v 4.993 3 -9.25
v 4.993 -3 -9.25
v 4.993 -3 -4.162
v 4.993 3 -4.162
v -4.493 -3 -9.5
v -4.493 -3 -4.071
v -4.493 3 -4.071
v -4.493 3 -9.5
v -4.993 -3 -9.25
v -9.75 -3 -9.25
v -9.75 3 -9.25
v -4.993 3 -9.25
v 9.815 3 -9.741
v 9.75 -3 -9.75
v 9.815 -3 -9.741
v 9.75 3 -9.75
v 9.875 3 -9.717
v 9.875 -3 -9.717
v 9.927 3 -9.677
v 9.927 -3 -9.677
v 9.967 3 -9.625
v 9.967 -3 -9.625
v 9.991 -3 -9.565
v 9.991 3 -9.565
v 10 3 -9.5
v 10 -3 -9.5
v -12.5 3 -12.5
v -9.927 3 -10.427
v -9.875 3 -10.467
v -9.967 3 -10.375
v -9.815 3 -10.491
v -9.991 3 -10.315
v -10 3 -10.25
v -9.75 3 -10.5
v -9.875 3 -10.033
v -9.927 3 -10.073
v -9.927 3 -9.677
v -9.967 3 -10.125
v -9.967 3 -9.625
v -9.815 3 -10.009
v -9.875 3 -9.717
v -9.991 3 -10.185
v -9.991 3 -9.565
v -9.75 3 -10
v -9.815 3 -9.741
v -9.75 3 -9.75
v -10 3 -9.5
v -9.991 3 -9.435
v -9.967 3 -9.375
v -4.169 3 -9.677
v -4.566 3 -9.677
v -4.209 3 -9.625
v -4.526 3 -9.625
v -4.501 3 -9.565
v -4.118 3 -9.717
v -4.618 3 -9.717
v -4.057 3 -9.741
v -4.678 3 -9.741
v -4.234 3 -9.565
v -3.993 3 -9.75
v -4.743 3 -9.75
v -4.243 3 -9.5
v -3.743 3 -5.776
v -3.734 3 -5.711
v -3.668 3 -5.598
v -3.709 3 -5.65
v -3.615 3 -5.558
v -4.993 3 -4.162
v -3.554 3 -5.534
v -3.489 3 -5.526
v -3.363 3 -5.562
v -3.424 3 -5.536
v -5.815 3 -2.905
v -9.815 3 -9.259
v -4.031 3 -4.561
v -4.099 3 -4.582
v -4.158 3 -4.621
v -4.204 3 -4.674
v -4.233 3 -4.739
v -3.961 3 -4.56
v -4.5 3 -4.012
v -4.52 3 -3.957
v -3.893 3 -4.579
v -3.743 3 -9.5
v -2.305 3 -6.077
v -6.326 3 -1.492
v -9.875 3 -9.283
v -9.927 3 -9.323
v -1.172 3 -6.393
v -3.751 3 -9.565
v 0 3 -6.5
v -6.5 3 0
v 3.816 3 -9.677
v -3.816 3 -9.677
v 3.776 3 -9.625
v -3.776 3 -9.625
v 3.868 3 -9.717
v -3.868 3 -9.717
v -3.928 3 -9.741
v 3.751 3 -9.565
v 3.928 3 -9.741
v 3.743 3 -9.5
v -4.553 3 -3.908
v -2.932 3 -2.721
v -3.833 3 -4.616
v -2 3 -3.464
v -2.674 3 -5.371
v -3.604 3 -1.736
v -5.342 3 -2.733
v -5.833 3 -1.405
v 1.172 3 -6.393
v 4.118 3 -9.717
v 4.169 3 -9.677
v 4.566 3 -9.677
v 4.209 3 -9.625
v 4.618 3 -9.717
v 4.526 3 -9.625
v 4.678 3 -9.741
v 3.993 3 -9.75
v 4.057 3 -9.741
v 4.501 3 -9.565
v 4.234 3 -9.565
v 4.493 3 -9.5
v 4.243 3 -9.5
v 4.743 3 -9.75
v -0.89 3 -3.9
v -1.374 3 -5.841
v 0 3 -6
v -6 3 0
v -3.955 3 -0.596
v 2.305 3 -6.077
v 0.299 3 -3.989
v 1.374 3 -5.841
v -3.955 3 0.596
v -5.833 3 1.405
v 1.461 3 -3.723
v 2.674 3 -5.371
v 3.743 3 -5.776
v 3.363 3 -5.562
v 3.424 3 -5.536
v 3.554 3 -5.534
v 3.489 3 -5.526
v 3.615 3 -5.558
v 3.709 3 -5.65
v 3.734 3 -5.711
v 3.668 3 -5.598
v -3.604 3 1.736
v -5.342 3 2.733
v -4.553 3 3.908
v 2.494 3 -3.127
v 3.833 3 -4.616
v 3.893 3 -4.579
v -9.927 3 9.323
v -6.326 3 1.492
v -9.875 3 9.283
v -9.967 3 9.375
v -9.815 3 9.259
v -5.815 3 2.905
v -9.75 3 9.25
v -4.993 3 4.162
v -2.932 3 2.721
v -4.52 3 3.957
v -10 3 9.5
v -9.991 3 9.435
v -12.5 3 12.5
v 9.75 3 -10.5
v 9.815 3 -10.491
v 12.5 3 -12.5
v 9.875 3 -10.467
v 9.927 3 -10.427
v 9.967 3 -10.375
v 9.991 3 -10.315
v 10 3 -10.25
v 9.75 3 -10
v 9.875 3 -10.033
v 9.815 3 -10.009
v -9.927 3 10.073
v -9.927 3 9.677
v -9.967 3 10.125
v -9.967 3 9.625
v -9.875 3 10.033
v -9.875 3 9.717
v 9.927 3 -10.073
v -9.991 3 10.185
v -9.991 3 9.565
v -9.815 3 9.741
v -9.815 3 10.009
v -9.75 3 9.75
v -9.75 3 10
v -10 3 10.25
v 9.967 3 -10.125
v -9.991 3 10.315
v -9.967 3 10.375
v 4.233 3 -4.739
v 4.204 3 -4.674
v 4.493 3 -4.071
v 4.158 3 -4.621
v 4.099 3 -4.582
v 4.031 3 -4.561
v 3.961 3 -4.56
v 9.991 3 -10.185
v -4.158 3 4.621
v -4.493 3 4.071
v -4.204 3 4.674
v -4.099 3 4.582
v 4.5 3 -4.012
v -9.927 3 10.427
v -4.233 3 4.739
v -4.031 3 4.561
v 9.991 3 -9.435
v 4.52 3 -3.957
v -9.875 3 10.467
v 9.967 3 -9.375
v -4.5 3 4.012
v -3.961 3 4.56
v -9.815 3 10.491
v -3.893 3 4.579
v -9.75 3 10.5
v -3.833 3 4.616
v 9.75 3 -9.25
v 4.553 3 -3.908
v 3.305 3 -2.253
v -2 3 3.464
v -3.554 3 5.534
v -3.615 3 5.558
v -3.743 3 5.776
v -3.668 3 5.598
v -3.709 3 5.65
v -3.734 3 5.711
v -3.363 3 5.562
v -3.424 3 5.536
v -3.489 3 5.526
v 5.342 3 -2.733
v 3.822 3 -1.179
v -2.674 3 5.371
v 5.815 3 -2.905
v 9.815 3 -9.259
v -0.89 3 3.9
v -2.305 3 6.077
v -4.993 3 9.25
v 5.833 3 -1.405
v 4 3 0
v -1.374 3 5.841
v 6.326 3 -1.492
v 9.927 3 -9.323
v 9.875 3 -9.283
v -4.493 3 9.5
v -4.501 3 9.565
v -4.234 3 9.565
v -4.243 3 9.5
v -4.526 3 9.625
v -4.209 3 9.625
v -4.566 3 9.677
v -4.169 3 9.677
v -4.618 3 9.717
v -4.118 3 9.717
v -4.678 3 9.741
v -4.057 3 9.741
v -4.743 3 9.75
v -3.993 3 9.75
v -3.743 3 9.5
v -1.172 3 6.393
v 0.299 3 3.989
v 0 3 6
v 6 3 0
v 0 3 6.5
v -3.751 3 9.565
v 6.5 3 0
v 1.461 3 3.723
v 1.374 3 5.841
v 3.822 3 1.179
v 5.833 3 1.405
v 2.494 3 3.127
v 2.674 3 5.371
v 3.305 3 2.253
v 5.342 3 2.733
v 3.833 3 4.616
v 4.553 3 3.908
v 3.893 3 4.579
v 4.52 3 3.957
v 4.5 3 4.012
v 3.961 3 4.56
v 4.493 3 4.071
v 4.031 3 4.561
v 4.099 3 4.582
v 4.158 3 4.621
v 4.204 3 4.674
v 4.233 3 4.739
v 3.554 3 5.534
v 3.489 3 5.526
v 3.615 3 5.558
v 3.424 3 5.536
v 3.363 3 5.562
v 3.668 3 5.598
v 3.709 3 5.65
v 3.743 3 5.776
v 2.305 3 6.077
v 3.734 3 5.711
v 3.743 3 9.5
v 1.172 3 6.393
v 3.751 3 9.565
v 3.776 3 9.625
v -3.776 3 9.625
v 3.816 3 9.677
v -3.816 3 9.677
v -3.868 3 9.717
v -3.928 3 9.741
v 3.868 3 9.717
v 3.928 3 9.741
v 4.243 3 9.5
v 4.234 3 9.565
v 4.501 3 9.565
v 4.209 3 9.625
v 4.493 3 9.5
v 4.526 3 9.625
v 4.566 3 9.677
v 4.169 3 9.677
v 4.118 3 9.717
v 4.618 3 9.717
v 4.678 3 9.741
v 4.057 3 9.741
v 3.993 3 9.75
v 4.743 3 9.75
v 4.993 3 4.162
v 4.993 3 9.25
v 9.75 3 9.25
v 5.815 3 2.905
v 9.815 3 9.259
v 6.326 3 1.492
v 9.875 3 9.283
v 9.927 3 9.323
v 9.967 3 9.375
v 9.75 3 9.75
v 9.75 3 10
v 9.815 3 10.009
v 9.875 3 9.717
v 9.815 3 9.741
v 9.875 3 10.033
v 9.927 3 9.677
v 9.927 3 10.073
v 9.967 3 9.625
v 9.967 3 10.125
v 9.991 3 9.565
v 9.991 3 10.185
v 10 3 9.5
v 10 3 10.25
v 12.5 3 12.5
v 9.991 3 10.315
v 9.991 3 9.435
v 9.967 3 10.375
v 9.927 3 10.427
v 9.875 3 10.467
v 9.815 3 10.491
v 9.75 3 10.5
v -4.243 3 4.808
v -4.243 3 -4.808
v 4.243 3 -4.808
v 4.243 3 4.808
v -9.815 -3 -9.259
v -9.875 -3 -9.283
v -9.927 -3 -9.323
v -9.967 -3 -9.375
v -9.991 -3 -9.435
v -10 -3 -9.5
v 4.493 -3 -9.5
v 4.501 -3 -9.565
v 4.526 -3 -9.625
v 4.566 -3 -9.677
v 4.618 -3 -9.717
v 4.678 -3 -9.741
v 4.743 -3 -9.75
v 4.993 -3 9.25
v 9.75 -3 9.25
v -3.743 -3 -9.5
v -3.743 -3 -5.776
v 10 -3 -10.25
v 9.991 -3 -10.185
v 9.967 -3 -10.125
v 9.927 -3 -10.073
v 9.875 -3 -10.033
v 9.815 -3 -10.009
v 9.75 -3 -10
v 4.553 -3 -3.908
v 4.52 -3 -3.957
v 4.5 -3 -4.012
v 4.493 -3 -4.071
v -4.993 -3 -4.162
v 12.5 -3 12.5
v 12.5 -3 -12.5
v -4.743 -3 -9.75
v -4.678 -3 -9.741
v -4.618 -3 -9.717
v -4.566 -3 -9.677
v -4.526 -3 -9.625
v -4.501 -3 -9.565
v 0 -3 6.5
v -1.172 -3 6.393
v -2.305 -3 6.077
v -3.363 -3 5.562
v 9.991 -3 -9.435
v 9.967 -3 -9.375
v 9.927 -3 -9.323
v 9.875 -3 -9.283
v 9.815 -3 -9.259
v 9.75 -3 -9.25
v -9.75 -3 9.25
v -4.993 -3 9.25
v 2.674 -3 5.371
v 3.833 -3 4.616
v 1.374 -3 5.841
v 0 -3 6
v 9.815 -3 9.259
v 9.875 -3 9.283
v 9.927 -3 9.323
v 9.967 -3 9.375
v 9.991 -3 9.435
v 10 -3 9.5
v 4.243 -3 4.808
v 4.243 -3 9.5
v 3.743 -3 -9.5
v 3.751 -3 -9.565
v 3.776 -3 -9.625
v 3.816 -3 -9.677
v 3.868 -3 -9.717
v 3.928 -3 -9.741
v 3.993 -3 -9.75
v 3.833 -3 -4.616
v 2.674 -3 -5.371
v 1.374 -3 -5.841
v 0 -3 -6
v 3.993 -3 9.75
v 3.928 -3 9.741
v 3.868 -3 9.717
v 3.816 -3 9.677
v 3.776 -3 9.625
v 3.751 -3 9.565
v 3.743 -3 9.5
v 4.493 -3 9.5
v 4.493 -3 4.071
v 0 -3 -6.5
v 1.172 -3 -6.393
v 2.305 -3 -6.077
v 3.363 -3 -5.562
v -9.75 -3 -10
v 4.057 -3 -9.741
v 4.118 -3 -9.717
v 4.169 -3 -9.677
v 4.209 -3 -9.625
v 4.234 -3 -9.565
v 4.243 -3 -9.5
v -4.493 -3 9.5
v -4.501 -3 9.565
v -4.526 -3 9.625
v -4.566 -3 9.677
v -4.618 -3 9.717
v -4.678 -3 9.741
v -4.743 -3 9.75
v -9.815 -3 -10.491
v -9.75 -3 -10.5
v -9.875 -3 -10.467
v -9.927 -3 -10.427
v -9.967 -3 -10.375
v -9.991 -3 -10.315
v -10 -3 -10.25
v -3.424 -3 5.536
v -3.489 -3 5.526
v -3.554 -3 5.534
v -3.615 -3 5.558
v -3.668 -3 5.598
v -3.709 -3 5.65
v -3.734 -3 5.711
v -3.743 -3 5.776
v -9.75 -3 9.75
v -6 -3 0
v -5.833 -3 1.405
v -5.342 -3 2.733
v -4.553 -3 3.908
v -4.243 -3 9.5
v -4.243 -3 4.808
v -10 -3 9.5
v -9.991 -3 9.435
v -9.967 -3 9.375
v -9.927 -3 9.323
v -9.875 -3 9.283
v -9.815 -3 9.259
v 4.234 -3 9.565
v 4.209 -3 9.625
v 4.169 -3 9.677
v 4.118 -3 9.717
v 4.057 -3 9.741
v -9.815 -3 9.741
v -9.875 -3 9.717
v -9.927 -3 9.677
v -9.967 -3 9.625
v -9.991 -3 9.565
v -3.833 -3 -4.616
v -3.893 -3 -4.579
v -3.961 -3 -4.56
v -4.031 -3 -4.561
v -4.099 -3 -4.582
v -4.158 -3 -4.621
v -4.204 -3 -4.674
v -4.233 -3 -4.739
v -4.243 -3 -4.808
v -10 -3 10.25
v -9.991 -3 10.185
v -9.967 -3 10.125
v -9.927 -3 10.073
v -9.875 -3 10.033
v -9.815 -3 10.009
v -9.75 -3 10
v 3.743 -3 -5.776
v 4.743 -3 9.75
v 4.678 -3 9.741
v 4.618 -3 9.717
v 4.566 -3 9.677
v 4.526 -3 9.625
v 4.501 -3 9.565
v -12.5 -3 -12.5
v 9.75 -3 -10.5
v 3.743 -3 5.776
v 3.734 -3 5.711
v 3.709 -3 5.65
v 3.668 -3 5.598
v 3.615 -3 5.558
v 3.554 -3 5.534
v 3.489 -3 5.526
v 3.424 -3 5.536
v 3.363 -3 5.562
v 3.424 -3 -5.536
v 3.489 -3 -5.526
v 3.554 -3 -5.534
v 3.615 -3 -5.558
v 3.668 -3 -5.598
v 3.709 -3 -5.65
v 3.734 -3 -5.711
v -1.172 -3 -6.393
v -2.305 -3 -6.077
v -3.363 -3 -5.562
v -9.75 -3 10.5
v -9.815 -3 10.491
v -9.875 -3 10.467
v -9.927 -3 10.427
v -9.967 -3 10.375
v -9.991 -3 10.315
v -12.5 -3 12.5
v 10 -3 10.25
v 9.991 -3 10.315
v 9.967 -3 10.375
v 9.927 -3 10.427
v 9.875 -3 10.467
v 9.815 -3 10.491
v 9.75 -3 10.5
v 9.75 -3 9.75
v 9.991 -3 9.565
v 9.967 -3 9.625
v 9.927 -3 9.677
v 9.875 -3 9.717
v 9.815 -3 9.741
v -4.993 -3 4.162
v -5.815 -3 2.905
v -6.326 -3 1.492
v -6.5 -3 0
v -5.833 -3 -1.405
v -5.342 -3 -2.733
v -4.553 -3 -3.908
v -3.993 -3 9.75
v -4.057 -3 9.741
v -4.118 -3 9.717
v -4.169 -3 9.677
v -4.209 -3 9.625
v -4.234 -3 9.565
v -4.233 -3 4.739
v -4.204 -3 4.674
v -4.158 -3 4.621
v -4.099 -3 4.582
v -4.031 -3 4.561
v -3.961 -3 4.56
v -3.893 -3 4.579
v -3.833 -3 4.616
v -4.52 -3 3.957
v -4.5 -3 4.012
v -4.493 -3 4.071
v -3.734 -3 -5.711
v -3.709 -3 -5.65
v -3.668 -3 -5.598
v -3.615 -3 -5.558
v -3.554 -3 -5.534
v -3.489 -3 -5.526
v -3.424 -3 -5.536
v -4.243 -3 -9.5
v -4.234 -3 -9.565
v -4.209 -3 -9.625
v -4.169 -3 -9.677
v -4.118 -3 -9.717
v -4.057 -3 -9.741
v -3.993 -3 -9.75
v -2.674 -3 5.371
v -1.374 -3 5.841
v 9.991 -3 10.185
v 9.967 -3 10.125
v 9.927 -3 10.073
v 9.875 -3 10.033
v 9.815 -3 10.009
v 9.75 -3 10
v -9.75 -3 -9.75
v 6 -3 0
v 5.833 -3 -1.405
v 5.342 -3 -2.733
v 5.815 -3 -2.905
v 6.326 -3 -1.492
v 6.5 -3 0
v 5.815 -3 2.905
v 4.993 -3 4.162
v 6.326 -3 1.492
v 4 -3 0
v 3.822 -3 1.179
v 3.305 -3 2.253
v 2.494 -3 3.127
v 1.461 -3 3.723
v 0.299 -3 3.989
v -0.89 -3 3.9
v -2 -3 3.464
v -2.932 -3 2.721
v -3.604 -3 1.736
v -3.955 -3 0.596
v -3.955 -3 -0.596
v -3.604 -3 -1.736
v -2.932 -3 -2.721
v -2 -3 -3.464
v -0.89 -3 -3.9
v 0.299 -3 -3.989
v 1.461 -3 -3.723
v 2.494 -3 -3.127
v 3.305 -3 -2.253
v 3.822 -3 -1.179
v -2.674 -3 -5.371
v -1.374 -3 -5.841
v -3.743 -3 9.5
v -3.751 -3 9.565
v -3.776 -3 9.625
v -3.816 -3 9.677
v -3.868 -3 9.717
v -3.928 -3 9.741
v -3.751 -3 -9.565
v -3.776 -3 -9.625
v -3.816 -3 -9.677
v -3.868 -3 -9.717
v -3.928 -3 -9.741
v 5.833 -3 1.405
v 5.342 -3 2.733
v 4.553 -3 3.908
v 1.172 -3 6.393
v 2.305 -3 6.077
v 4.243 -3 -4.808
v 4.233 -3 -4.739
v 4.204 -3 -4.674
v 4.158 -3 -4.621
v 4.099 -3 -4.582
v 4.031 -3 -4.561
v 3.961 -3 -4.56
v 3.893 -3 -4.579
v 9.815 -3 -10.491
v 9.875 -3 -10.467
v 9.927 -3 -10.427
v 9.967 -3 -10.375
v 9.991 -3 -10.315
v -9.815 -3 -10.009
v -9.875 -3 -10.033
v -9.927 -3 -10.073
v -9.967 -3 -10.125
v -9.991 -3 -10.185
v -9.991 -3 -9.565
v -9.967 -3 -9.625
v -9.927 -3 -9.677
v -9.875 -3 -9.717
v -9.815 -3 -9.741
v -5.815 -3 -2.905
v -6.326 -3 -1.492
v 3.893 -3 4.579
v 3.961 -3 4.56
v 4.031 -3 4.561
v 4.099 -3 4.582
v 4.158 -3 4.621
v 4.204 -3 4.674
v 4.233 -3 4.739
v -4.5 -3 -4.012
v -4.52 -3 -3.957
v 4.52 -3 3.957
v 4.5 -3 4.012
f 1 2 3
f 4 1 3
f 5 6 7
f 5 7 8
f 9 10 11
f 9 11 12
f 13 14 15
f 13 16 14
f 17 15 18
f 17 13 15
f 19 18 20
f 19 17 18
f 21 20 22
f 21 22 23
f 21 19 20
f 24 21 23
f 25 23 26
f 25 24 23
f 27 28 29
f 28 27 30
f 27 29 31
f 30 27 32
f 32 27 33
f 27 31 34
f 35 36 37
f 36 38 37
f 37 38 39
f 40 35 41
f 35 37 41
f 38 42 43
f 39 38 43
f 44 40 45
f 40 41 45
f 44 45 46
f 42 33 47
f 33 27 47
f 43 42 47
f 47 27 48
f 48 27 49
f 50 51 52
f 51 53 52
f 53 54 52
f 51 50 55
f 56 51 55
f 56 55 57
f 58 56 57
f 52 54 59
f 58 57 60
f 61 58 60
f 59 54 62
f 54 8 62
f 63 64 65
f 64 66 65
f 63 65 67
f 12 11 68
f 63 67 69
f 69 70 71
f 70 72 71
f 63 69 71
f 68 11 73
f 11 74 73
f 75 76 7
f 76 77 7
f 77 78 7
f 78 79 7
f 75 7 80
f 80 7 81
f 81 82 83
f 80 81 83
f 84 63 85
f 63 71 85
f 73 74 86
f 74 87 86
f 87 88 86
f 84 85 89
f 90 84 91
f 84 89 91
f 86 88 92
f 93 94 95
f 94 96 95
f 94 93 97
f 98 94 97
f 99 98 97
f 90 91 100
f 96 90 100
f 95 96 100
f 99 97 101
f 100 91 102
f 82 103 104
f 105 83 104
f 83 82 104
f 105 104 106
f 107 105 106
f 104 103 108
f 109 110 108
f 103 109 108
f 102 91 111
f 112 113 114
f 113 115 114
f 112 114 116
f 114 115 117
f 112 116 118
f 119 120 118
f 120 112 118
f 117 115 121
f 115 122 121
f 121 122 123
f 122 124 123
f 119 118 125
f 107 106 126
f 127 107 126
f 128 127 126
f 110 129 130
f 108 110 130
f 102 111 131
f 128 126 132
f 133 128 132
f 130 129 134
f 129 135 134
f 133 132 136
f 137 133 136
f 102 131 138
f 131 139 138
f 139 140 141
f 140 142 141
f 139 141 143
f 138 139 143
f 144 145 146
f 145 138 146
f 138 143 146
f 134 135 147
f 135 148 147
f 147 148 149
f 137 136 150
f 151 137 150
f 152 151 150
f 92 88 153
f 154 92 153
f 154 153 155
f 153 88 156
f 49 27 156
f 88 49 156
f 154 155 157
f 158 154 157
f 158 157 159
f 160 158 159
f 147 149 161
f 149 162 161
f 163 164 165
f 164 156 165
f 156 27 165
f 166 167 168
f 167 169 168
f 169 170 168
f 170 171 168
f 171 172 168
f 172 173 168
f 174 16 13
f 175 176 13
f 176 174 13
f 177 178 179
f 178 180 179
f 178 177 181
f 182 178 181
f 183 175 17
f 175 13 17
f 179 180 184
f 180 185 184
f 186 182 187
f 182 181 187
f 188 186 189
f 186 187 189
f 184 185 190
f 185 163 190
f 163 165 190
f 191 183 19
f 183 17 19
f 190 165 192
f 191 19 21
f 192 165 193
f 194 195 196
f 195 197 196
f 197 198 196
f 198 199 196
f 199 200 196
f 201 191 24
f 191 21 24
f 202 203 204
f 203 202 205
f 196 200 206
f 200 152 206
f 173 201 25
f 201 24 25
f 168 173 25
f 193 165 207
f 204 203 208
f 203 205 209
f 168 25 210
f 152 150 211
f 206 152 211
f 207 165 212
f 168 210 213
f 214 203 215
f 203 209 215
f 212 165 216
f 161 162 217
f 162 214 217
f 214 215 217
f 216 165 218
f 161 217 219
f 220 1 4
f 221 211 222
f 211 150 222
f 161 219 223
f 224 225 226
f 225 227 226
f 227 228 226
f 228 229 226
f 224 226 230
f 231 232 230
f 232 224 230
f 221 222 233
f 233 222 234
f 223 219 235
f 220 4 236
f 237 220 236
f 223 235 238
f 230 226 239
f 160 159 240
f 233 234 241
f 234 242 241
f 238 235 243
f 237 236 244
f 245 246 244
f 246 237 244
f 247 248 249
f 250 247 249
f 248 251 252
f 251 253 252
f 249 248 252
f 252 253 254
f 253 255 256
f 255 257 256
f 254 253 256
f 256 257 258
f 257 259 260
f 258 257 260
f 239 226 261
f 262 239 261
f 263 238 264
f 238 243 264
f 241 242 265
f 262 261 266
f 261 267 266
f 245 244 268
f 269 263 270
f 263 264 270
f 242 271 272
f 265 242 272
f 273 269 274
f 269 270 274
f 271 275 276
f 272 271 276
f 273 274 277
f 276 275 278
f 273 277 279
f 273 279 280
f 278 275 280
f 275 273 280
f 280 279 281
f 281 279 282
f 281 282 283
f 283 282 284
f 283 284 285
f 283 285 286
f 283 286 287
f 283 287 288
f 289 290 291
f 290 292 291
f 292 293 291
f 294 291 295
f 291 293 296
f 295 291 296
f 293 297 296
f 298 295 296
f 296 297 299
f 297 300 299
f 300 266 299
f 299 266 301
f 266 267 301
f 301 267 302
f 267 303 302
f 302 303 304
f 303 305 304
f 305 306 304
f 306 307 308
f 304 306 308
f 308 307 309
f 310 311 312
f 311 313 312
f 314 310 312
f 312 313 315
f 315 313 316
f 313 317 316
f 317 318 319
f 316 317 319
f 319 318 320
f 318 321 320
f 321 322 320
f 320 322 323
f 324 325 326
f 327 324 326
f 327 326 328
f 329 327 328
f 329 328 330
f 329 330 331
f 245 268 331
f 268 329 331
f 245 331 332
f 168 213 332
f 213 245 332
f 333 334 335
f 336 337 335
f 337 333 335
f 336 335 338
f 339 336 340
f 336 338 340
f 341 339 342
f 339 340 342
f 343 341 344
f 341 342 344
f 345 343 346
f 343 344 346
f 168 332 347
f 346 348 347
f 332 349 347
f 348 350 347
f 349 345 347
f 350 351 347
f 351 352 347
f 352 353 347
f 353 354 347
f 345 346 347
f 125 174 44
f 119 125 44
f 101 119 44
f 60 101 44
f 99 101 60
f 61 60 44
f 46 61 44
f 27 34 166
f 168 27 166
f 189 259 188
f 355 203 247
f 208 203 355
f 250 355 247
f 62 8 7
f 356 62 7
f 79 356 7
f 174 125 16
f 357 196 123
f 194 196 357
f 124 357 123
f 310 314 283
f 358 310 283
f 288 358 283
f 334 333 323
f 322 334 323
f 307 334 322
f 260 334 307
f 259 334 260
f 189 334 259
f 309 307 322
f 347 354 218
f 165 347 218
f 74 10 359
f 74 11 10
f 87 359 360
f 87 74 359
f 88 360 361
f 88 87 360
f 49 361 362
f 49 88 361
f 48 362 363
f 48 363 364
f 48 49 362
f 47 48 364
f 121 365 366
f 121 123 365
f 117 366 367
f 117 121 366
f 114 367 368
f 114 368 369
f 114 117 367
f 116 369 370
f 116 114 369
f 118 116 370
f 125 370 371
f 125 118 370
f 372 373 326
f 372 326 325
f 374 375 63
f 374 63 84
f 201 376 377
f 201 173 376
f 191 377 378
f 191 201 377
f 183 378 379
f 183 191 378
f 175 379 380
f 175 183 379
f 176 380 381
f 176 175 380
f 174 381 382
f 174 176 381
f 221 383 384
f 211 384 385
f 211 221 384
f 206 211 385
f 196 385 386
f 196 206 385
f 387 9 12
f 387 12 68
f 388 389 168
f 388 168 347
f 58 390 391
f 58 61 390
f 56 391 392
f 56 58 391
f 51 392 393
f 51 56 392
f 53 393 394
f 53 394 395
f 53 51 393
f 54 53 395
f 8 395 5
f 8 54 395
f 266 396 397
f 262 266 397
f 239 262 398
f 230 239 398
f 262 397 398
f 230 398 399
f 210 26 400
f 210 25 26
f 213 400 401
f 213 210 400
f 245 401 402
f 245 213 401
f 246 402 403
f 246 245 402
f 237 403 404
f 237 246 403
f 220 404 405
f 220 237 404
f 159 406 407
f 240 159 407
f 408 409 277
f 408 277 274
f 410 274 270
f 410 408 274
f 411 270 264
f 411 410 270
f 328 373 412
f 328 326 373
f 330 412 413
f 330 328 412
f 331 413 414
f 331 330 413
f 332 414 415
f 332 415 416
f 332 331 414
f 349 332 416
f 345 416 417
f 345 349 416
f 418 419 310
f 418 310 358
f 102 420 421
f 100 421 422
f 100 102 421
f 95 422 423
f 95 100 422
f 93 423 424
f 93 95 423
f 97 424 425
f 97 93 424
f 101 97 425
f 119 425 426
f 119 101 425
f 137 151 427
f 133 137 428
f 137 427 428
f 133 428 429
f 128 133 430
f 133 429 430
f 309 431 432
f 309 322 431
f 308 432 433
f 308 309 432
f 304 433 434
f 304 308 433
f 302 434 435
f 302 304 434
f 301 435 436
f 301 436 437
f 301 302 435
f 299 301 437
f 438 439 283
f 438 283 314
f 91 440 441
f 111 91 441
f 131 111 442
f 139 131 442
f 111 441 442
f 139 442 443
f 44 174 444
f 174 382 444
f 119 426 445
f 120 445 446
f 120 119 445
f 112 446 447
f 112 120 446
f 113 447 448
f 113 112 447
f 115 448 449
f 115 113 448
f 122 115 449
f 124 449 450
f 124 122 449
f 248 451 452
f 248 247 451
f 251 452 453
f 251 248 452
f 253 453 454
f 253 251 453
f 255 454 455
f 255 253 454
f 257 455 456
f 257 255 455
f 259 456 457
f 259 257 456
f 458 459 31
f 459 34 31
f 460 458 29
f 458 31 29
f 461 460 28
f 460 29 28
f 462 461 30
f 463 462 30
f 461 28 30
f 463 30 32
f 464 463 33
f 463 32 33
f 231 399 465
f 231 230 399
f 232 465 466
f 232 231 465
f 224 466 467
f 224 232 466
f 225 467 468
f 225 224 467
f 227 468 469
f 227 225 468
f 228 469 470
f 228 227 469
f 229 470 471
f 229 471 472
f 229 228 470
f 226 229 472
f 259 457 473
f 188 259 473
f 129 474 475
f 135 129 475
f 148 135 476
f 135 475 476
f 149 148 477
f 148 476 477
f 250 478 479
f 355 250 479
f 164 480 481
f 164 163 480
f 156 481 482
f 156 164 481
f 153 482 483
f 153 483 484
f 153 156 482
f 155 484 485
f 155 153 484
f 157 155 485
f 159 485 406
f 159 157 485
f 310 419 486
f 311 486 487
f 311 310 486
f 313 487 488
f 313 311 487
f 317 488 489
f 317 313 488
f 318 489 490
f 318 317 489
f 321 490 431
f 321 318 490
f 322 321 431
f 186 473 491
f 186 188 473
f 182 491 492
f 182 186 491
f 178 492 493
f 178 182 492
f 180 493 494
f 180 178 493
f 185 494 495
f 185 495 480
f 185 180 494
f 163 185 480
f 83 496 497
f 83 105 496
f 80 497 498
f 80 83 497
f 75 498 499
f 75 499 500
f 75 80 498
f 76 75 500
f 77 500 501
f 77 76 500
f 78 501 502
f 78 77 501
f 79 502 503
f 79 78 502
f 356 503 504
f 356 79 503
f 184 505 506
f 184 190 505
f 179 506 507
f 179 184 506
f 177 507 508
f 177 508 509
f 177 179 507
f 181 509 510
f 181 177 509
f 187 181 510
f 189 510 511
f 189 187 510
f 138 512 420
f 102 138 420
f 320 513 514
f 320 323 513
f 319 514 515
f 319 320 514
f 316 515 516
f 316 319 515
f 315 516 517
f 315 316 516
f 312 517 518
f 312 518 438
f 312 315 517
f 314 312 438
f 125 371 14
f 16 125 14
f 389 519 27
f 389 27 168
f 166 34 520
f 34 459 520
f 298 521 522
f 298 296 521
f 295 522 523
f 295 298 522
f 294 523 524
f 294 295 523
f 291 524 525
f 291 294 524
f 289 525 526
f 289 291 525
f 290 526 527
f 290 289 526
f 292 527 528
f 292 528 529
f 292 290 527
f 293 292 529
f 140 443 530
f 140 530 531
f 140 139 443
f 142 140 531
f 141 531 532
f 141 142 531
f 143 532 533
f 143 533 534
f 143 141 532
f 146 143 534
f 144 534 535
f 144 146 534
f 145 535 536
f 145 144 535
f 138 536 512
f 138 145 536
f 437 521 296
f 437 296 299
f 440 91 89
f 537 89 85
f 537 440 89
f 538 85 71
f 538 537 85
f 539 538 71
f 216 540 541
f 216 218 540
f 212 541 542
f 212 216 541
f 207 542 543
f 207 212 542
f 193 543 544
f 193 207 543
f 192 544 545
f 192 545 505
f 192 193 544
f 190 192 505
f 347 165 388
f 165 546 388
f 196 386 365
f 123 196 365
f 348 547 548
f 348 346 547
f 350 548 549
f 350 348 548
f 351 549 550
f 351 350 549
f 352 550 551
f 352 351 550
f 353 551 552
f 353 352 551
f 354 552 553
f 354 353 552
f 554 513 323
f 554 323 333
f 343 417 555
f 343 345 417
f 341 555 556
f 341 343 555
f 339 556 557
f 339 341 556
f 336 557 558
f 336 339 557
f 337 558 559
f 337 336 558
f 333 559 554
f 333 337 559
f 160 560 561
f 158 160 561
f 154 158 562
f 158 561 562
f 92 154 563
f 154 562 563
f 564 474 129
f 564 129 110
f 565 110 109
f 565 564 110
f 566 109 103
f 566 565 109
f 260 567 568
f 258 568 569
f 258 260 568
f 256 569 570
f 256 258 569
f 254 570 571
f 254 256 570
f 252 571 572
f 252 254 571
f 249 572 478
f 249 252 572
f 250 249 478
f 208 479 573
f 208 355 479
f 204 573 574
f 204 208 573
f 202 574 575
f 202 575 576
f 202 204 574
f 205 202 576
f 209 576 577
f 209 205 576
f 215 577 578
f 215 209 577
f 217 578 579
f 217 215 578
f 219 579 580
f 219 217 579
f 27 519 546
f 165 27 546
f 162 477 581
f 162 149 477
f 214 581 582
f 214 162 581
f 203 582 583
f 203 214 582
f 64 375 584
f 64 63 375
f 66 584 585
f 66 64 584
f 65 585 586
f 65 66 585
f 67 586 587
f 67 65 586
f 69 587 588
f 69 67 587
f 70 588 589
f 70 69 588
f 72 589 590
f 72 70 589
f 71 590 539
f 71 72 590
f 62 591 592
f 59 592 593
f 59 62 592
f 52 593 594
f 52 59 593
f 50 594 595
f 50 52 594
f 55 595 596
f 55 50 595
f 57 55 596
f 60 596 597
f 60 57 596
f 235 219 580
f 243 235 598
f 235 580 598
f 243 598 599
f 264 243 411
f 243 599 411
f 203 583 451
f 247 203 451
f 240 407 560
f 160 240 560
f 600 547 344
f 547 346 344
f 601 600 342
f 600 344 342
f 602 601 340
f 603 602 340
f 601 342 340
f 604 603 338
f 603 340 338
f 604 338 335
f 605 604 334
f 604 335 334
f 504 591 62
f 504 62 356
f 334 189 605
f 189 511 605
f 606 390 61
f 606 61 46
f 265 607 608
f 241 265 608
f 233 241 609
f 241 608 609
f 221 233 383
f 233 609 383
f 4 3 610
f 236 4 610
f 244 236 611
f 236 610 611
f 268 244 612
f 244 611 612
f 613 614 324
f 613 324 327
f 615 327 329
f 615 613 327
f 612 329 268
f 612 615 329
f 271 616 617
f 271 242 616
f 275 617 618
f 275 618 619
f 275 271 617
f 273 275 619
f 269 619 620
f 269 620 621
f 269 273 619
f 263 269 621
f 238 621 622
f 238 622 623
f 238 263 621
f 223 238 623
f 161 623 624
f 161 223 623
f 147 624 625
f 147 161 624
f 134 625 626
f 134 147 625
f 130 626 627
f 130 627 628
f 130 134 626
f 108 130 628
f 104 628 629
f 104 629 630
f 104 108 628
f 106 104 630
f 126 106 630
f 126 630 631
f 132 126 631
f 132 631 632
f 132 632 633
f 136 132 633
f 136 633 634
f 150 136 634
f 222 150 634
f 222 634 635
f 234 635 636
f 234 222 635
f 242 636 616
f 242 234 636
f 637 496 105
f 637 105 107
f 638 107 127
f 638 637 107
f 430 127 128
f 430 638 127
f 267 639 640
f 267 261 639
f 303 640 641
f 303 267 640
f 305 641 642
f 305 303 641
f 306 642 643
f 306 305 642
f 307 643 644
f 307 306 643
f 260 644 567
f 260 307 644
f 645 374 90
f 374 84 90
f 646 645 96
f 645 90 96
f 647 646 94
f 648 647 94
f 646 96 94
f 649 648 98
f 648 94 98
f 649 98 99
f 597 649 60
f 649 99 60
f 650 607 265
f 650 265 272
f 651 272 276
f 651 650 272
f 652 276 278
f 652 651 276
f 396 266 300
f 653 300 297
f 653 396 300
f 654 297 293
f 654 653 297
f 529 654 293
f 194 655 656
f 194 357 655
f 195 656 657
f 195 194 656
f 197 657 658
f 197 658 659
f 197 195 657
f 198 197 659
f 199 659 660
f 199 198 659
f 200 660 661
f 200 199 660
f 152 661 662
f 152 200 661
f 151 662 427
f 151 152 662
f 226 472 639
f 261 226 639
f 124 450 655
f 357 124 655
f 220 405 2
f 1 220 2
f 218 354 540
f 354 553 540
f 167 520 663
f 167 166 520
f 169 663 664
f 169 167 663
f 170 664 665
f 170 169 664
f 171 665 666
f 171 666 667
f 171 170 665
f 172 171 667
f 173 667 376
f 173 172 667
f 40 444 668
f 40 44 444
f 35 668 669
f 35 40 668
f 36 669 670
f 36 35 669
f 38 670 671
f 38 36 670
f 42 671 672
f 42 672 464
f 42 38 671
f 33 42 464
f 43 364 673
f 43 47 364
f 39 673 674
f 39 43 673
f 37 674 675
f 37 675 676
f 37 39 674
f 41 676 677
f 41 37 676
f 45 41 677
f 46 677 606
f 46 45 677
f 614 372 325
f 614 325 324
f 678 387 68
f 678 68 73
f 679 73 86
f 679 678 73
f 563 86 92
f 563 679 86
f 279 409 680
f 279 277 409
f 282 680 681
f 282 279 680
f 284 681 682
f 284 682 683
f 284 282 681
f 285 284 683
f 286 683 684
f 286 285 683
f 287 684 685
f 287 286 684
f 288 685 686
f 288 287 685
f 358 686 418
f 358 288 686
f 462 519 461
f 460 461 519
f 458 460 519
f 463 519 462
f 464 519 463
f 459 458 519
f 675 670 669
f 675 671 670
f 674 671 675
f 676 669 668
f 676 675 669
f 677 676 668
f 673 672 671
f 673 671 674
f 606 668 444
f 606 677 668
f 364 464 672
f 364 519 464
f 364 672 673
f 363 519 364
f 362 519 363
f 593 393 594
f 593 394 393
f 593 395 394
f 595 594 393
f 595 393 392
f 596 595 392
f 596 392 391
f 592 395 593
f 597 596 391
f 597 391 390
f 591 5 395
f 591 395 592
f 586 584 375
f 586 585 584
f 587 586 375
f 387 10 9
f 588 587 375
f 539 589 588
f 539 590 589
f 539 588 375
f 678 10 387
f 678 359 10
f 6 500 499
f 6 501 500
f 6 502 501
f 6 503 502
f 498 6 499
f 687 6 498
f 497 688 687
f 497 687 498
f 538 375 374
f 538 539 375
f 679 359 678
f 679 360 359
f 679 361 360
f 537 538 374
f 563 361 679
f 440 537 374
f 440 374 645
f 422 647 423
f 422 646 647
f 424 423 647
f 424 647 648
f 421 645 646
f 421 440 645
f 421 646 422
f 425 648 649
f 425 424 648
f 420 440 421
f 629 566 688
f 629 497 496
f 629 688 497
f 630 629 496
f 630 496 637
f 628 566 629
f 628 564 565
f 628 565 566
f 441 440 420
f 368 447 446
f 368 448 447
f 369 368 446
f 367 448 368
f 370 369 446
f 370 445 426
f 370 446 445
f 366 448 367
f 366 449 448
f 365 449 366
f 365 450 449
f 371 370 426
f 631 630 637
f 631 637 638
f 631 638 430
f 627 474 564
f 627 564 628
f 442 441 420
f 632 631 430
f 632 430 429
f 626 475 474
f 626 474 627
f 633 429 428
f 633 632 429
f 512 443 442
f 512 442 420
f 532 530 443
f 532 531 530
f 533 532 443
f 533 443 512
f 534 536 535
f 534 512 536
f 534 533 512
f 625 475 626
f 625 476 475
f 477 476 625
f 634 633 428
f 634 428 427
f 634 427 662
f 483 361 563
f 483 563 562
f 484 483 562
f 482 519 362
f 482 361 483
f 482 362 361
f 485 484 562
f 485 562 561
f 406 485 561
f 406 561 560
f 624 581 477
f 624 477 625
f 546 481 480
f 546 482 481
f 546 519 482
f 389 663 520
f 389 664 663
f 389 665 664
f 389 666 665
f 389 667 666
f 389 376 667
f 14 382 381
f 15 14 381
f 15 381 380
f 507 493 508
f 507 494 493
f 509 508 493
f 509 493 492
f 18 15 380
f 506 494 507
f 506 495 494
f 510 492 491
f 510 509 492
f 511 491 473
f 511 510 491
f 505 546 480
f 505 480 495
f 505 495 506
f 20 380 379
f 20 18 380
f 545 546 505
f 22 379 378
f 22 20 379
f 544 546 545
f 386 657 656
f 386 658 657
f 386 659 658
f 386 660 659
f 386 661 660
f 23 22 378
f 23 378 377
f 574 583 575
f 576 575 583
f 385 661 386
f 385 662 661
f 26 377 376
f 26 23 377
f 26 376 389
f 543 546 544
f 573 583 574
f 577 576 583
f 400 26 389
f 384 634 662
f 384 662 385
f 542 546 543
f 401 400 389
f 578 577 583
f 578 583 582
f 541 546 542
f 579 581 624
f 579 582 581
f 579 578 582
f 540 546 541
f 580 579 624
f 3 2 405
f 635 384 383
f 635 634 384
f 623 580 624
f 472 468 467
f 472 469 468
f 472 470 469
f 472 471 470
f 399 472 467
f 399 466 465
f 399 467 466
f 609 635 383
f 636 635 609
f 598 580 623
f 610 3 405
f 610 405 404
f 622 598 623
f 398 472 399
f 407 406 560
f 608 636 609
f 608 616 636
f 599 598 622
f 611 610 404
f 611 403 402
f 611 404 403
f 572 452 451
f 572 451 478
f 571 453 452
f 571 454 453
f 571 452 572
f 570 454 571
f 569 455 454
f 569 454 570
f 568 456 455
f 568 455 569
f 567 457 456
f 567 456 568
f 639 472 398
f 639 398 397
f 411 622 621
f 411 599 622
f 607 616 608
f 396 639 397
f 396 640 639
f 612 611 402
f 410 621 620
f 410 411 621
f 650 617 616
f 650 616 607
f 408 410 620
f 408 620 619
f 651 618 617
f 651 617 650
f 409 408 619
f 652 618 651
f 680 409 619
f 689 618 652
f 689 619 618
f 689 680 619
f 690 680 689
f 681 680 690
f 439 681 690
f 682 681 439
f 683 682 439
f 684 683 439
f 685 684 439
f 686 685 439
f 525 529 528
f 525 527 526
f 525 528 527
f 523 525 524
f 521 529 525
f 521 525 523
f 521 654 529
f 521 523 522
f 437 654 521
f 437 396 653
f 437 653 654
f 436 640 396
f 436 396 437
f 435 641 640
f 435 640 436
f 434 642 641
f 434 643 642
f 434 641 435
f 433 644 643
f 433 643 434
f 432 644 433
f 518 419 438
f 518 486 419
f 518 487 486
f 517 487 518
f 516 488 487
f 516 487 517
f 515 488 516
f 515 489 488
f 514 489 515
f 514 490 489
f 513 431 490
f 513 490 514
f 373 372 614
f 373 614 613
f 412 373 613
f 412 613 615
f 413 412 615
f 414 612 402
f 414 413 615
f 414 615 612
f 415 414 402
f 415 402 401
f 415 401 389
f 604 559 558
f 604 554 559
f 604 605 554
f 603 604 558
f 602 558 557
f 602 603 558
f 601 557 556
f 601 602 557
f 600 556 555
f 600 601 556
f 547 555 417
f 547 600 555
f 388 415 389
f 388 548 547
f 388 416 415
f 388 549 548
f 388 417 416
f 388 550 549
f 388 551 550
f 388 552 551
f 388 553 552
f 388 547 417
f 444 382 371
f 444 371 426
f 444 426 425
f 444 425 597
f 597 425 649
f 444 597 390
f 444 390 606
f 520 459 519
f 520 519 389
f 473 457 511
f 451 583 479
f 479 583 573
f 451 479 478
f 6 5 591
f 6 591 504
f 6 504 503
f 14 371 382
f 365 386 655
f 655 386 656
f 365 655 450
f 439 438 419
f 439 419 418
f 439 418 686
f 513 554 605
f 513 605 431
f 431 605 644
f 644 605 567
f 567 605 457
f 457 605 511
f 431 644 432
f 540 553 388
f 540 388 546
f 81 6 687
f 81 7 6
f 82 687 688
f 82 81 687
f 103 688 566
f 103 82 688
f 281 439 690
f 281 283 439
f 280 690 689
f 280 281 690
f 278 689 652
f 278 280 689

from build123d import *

# Parameters (mm, degrees)
F0_W             = 25
F0_H             = 25
F0_R             = 4
F1_DEPTH         = 3
F2_W             = 10
F2_H             = 0.5
F3_DEPTH         = 6.001
F3_COPIES2_COUNT = 2
F4_R             = 0.24999


# Not quite as in the source:
# - a fillet or chamfer is up to 0.001 mm smaller than in the source, because OpenCascade refuses the exact size
# - a pattern or mirror of a feature is missing from the dataset's text; its kind, count and spacing are read off the source's solid


with BuildPart() as f1:
    # F0 (on Front) → F1 (new body, symmetric)
    with BuildSketch(Plane.XZ):
        Rectangle(F0_W, F0_H)
        Circle(F0_R, mode=Mode.SUBTRACT)
    extrude(amount=F1_DEPTH, both=True)

    # F2 (on face) → F3 (cut, through all)
    with BuildSketch(Plane.XZ.offset(3)):
        with BuildLine():
            ThreePointArc((-4.2426406871, 4.2426406871), (-2.2961005942, 5.5432771951), (0, 6))
            Line((0, 6), (0, 6.5))
            ThreePointArc((0, 6.5), (-1.96297305, 6.1965100504), (-3.7426406871, 5.3143805554))
            Line((-3.7426406871, 5.3143805554), (-3.7426406871, 9.75))
            Line((-3.7426406871, 9.75), (-4.2426406871, 9.75))
            Line((-4.2426406871, 9.75), (-4.2426406871, 4.2426406871))
        make_face()
        with BuildLine():
            Line((-6.5, 0), (-6, 0))
            ThreePointArc((-6, 0), (-5.6105188763, 2.1265177965), (-4.4926406871, 3.9769560793))
            Line((-4.4926406871, 3.9769560793), (-4.4926406871, 9.75))
            Line((-4.4926406871, 9.75), (-10, 9.75))
            Line((-10, 9.75), (-10, 9.25))
            Line((-10, 9.25), (-4.9926406871, 9.25))
            Line((-4.9926406871, 9.25), (-4.9926406871, 4.1621555677))
            ThreePointArc((-4.9926406871, 4.1621555677), (-6.1115531768, 2.2133498971), (-6.5, 0))
        make_face()
        with Locations((-5, 10.25)):
            Rectangle(F2_W, F2_H)
    f3 = extrude(amount=-F3_DEPTH, mode=Mode.SUBTRACT)

    # F3_copies: F3 across plane
    add(f3.mirror(Plane(origin=(0, 0, 0), x_dir=(-1, 0, 0), z_dir=(0, 0, -1))), mode=Mode.SUBTRACT)

    # F3_copies1: F3 across plane
    add(f3.mirror(Plane(origin=(0, 0, 0), x_dir=(0, 0, 1), z_dir=(1, 0, 0))), mode=Mode.SUBTRACT)

    # F3_copies2: F3 ×2 about axis
    f3_copies2_axis = Axis((0, 0, 0), (0, 1, 0))
    for i in range(1, F3_COPIES2_COUNT):
        add(f3.rotate(f3_copies2_axis, i * 360 / F3_COPIES2_COUNT), mode=Mode.SUBTRACT)

    # F4 (radius 0.25 in the source; OpenCascade refuses exactly that, so slightly less here)
    f4_edges = [f1.edges().sort_by_distance(p)[0] for p in [
        (-10, 0, 10),
        (-4.492641, 0, 9.75),
        (-4.492641, 0, 3.976956),
        (-4.242641, 0, 4.242641),
        (-10, 0, 10.5),
        (-4.242641, 0, 9.75),
        (-10, 0, 9.25),
        (-10, 0, 9.75),
        (-3.742641, 0, 9.75),
        (-3.742641, 0, 5.314381),
        (10, 0, 10),
        (10, 0, 10.5),
        (10, 0, 9.25),
        (10, 0, 9.75),
        (4.492641, 0, 9.75),
        (4.492641, 0, 3.976956),
        (4.492641, 0, -3.976956),
        (4.492641, 0, -9.75),
        (10, 0, -9.75),
        (10, 0, -9.25),
        (4.242641, 0, 4.242641),
        (4.242641, 0, 9.75),
        (3.742641, 0, 9.75),
        (3.742641, 0, 5.314381),
        (-10, 0, -9.25),
        (-10, 0, -9.75),
        (-4.492641, 0, -9.75),
        (-4.492641, 0, -3.976956),
        (-3.742641, 0, -9.75),
        (-3.742641, 0, -5.314381),
        (3.742641, 0, -5.314381),
        (3.742641, 0, -9.75),
        (4.242641, 0, -9.75),
        (4.242641, 0, -4.242641),
        (-4.242641, 0, -4.242641),
        (-4.242641, 0, -9.75),
        (10, 0, -10),
        (10, 0, -10.5),
        (-10, 0, -10),
        (-10, 0, -10.5),
    ]]
    fillet(f4_edges, radius=F4_R)


solid = f1.part
